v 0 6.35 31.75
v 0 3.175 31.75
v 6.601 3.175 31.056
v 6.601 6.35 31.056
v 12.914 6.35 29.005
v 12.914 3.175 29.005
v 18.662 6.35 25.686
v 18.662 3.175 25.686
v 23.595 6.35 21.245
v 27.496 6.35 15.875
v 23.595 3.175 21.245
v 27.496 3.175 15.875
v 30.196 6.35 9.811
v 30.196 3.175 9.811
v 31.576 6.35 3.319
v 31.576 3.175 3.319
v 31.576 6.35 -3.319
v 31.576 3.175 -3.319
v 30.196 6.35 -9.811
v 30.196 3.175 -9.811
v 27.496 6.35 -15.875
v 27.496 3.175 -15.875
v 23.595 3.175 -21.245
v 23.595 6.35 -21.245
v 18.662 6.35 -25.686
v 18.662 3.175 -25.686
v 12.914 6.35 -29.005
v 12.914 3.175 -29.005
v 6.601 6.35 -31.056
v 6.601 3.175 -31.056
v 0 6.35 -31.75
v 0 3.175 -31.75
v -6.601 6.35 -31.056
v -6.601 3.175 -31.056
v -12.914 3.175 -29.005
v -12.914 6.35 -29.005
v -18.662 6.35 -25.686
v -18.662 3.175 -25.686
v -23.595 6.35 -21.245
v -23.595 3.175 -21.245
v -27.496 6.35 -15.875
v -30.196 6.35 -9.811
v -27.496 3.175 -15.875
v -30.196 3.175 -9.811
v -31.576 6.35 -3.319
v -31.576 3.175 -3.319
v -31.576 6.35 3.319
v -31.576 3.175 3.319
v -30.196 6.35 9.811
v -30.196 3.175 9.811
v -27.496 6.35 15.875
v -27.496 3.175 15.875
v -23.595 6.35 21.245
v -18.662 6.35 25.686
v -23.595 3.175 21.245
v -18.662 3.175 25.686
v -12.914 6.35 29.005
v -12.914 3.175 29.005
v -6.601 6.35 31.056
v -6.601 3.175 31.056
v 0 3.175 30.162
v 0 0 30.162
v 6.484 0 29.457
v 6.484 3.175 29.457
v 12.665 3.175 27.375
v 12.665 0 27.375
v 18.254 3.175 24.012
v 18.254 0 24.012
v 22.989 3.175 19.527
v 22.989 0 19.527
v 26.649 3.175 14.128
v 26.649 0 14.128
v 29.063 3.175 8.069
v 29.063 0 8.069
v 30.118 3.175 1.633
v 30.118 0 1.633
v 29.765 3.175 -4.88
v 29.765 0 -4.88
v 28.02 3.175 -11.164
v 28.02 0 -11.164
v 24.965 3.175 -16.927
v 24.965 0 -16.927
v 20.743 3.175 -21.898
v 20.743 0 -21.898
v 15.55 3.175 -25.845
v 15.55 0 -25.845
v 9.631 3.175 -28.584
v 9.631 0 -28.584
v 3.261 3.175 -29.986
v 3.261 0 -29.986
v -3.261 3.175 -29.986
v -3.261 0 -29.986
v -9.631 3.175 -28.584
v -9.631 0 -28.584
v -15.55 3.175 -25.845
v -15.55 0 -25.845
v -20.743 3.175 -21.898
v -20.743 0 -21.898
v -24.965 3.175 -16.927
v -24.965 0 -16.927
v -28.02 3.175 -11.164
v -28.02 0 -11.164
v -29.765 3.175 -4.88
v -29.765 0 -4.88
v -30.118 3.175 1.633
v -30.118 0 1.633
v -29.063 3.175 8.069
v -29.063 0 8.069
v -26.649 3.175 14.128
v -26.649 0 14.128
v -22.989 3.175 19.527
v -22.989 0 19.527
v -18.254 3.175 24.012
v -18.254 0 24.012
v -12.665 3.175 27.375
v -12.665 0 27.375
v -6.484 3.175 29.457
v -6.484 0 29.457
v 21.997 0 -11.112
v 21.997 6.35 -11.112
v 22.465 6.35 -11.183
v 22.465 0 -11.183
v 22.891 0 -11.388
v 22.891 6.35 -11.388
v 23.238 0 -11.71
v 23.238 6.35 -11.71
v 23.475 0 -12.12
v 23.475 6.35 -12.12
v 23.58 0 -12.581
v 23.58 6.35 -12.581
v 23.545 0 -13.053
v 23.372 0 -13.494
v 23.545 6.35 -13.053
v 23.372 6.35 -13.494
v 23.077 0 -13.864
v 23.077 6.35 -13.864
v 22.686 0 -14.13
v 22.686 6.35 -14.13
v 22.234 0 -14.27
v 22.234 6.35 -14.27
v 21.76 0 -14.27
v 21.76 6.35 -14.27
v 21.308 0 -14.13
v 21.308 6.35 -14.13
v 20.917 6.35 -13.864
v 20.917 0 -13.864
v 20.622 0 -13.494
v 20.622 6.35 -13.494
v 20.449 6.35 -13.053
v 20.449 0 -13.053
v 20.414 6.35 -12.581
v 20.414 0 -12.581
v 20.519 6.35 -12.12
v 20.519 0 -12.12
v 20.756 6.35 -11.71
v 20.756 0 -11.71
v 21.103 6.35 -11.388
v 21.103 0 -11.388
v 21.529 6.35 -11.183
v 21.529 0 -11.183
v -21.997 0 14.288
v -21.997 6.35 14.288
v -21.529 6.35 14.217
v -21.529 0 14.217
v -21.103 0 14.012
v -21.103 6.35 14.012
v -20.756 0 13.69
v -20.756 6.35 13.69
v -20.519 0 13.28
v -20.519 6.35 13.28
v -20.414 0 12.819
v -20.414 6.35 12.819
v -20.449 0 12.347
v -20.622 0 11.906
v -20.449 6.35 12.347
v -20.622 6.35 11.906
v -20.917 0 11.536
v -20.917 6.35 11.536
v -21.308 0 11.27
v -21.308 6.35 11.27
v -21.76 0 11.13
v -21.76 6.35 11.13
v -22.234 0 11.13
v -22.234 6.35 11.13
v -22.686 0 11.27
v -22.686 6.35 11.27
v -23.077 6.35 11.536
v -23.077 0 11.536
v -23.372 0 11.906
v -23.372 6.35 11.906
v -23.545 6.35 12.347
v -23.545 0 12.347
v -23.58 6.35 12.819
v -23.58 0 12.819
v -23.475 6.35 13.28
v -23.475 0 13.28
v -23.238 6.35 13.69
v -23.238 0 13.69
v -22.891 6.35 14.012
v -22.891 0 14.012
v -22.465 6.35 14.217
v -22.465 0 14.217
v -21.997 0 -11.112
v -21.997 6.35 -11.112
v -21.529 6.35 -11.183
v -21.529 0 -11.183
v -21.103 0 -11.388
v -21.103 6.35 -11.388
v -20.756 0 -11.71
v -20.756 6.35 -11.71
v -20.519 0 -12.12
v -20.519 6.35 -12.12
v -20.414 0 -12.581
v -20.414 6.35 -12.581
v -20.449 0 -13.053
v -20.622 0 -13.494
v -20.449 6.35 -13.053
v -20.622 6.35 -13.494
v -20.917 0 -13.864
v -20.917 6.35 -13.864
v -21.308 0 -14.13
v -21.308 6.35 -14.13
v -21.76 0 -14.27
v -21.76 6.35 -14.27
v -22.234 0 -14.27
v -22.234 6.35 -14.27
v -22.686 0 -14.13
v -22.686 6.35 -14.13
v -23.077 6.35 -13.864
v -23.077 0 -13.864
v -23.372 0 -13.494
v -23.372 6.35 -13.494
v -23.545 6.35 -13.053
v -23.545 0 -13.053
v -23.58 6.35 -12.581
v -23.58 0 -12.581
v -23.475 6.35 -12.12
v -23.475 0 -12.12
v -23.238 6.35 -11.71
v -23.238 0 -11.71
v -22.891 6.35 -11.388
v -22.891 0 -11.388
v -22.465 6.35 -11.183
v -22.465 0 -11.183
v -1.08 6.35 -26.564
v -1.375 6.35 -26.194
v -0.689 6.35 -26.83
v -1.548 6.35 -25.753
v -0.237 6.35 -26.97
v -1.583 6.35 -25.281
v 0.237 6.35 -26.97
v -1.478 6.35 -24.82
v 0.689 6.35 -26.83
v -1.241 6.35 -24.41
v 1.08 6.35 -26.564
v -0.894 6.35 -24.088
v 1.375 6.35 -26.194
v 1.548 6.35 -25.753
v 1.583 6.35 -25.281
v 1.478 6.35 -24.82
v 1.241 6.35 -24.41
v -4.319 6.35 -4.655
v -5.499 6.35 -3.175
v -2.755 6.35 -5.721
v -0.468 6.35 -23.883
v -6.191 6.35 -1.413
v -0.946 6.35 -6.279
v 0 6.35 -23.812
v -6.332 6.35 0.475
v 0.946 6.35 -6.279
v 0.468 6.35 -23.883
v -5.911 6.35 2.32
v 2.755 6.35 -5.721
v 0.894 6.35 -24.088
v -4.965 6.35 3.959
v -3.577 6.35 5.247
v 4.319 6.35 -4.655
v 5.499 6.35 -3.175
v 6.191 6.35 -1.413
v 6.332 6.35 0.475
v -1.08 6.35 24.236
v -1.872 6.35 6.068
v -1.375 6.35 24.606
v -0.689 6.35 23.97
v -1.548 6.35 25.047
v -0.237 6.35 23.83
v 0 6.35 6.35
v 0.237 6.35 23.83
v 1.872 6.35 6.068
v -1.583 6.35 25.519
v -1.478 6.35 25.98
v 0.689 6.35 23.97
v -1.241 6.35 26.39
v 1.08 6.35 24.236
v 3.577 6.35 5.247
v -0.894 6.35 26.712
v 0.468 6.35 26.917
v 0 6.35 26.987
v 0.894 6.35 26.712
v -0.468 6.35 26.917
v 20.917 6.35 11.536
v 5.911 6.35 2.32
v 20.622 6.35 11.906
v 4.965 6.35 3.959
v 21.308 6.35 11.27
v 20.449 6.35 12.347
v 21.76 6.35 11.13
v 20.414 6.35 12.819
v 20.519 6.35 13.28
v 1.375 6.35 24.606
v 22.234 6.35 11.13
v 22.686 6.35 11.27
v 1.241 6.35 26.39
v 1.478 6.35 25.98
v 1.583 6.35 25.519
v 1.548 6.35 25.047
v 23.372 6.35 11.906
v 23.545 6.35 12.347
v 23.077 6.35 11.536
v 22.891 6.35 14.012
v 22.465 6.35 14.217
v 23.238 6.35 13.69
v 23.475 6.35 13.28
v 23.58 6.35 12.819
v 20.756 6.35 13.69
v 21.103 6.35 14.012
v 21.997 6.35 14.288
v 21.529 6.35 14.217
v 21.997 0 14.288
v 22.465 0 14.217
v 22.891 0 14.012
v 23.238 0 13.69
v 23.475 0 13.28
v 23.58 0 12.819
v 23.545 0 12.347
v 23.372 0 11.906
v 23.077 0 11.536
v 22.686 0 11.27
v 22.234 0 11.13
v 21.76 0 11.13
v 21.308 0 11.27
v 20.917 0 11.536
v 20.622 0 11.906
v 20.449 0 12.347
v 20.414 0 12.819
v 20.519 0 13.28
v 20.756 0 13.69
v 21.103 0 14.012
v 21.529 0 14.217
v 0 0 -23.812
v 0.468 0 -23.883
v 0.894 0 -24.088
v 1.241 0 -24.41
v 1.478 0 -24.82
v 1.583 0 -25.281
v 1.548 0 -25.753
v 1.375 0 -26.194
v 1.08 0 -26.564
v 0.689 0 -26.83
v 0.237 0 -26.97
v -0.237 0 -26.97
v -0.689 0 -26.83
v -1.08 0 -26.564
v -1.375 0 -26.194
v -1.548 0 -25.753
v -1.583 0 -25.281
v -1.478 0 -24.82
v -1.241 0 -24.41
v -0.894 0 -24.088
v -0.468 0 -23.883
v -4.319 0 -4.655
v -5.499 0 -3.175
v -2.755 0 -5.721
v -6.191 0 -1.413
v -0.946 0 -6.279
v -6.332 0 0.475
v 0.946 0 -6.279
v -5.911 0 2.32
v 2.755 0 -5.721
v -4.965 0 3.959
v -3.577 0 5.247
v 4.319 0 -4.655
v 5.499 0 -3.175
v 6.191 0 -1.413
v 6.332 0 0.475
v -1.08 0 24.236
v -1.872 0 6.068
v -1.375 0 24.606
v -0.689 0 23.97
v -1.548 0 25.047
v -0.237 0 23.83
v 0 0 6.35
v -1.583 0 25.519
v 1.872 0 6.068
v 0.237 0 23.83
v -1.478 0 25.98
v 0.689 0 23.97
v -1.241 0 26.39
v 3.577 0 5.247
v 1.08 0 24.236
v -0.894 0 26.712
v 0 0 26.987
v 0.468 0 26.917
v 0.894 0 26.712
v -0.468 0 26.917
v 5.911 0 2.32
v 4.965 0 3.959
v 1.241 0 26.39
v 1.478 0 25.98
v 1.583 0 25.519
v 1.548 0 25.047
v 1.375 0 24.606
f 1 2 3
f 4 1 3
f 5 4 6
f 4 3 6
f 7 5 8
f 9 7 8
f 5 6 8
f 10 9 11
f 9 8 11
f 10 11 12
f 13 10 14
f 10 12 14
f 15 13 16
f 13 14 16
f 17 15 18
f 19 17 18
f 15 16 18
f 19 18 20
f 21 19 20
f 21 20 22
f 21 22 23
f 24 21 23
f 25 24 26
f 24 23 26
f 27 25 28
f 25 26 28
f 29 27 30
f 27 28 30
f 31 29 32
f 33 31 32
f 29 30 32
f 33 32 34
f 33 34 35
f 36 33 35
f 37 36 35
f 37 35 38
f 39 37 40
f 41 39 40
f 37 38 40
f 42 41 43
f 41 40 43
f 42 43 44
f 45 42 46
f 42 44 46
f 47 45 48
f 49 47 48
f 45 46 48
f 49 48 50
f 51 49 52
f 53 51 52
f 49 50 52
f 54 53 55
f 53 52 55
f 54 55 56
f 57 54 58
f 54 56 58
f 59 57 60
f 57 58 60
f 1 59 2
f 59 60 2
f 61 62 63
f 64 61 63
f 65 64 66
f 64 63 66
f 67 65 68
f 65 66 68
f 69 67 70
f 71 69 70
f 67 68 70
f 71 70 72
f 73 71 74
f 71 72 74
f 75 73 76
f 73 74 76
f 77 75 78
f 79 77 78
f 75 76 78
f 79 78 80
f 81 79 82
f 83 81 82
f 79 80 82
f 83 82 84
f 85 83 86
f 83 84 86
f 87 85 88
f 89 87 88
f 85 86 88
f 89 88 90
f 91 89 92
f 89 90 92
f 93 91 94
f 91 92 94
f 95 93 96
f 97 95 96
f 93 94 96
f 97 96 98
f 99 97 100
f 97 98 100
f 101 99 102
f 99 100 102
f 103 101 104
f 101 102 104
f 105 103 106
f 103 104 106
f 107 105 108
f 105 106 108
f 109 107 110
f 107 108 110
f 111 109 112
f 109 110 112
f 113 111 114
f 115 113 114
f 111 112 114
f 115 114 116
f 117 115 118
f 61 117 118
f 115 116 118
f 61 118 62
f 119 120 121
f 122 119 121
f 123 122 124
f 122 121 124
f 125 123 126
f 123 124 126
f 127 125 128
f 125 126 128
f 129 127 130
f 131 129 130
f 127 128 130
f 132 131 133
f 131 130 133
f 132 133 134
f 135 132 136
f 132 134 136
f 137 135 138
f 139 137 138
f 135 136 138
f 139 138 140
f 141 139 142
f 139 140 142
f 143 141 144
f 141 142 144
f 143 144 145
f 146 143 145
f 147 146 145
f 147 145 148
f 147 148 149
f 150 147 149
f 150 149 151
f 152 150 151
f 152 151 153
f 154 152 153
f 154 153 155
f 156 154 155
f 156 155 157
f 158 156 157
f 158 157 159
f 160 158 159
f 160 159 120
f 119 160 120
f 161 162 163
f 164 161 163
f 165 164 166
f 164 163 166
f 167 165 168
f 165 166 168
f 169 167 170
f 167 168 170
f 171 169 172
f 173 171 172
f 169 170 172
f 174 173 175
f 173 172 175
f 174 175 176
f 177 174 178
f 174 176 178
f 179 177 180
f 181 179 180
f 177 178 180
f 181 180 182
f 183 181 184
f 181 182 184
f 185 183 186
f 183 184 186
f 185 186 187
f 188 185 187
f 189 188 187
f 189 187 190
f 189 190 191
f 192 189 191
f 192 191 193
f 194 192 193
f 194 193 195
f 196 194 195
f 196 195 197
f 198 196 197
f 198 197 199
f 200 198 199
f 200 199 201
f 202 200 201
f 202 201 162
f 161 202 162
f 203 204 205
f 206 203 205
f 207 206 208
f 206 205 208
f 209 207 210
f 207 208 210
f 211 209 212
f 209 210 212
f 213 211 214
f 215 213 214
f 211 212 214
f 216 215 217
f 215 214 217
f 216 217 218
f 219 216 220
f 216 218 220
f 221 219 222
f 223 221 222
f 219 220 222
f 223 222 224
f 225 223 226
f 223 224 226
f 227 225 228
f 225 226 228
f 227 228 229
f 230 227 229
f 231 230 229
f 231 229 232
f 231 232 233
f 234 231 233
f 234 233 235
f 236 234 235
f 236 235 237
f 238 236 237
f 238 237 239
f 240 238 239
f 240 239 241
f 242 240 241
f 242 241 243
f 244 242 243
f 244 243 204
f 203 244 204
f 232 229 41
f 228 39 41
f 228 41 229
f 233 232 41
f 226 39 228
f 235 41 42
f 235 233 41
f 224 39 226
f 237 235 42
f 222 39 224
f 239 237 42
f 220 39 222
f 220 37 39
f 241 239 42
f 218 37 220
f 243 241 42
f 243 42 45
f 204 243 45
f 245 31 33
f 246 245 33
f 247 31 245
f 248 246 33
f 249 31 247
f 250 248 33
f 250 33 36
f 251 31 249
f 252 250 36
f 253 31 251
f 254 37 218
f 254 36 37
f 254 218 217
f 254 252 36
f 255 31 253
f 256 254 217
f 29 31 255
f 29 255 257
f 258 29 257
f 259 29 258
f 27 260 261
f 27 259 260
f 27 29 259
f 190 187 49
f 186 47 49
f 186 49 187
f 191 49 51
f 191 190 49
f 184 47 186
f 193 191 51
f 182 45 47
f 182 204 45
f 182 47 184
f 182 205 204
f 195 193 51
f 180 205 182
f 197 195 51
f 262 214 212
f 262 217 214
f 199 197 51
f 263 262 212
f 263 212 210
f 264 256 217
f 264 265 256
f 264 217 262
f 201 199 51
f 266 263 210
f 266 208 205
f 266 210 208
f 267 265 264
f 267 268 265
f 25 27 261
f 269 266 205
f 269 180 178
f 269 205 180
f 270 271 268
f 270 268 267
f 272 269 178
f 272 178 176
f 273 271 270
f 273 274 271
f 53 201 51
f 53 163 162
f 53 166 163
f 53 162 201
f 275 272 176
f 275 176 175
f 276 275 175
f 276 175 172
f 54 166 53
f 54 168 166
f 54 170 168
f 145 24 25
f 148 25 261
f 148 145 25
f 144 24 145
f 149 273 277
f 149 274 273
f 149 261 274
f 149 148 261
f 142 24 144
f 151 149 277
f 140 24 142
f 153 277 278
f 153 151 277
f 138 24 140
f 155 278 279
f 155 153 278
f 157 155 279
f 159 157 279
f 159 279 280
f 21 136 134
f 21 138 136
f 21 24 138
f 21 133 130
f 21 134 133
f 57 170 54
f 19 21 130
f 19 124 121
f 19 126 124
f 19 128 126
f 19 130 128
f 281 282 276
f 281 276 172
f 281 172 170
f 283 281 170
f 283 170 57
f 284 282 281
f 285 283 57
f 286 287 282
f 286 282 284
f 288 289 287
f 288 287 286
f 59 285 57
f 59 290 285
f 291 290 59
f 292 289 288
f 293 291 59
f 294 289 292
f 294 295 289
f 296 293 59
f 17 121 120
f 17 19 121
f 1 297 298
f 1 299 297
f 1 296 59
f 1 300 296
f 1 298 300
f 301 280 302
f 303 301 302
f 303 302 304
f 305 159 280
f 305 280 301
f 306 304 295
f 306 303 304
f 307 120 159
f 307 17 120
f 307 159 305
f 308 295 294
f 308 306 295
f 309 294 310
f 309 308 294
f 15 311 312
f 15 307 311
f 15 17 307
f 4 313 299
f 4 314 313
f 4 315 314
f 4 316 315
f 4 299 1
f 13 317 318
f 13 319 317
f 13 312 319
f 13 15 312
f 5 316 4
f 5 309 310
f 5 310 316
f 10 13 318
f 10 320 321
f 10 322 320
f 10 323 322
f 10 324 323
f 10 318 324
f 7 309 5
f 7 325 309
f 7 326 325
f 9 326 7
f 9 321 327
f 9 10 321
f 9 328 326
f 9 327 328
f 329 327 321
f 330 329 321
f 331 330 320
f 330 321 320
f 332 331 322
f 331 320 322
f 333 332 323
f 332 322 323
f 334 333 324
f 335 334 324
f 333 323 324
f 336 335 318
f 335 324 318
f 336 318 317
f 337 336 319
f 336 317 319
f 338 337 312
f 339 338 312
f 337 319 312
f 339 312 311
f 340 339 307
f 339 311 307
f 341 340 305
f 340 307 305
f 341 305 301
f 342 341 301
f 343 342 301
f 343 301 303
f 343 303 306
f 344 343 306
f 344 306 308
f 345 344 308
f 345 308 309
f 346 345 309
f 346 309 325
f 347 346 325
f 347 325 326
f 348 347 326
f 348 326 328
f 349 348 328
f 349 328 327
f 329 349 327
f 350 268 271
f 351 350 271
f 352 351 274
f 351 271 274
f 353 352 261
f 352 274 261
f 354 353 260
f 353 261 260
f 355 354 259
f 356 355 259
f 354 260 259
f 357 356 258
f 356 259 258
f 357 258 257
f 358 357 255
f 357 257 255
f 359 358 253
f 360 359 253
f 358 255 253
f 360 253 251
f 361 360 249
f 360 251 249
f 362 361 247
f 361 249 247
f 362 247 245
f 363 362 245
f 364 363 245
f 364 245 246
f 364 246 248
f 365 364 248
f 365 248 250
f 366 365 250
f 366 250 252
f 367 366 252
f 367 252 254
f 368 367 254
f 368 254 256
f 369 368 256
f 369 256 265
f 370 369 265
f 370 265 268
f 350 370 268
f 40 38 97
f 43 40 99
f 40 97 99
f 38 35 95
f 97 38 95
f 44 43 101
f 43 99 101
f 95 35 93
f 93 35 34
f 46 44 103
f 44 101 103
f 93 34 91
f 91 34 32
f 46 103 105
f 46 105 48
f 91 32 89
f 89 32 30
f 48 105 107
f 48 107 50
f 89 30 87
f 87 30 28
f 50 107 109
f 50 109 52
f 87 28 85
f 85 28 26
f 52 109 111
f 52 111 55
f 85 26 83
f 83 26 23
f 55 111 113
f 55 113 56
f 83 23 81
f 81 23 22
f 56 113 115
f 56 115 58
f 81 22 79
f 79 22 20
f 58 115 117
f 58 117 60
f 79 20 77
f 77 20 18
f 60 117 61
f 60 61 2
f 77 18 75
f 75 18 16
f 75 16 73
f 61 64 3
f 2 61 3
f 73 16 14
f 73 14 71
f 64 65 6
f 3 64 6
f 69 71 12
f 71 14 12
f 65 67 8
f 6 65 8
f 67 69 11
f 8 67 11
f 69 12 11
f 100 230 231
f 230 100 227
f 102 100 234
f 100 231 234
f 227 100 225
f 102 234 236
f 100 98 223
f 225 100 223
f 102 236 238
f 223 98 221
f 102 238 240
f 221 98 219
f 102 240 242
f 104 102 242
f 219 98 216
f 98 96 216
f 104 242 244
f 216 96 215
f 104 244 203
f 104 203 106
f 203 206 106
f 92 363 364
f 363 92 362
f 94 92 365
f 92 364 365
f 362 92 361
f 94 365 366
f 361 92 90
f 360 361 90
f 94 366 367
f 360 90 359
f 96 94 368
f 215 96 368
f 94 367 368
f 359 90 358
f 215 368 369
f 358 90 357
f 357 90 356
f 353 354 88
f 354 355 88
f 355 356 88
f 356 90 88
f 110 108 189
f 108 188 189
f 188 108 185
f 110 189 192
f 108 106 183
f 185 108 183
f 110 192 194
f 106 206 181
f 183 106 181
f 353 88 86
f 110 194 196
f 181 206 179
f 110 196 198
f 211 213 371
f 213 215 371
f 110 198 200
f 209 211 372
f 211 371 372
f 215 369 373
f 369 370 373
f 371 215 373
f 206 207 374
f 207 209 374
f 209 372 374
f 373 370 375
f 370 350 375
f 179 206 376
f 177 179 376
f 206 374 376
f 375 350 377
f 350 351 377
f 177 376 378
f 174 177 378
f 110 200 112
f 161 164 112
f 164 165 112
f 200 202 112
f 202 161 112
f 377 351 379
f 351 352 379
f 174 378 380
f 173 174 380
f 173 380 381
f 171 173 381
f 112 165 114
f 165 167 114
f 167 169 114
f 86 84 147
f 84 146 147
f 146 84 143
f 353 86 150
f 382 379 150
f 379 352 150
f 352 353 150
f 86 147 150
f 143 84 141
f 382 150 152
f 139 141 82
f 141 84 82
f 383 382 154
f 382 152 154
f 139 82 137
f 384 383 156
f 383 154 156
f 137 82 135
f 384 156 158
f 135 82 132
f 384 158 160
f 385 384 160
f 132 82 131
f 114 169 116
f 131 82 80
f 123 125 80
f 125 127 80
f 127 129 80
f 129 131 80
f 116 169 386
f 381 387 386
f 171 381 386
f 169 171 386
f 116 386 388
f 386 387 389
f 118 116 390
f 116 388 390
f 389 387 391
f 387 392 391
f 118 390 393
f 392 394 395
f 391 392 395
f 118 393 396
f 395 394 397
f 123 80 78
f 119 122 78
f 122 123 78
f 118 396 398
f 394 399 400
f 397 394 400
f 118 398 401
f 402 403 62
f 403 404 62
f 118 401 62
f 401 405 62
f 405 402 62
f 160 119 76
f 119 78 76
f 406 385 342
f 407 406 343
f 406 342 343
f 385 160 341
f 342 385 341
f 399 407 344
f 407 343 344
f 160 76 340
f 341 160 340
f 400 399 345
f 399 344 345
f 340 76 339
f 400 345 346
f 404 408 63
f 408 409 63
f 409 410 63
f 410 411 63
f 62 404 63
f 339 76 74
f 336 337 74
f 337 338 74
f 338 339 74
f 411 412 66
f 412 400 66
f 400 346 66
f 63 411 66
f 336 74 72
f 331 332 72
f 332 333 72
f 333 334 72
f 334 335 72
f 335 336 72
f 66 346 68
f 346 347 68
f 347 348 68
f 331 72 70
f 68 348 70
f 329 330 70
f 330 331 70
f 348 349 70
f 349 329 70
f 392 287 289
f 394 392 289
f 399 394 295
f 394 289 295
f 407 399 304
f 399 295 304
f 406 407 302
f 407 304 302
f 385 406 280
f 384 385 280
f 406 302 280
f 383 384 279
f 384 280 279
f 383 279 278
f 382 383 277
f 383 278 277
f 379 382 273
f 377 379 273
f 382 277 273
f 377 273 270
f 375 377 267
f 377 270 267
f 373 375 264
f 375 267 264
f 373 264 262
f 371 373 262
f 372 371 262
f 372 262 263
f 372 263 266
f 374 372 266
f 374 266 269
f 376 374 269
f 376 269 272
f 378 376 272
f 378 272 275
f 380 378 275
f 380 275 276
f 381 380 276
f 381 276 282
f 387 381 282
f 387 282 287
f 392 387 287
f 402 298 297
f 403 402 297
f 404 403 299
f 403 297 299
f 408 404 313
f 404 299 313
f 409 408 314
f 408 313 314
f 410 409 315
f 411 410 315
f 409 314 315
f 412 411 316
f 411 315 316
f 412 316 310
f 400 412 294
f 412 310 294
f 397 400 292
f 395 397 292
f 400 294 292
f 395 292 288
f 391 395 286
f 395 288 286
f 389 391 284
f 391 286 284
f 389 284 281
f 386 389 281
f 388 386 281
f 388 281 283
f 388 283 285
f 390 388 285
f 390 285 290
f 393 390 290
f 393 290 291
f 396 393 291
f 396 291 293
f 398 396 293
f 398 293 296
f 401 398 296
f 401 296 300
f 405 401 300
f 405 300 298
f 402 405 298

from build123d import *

# Parameters (mm, degrees)
SKETCH1_R           = 30.1625
BOSS_EXTRUDE1_DEPTH = 3.175
SKETCH2_R           = 31.75
BOSS_EXTRUDE2_DEPTH = 3.175
SKETCH3_R           = 1.5875
SKETCH3_R_2         = 6.35
CUT_EXTRUDE1_DEPTH  = 46.348070521


with BuildPart() as part:
    # Sketch1 → Boss-Extrude1 (new body)
    with BuildSketch(Plane(origin=(0, 0, 0), x_dir=(1, 0, 0), z_dir=(0, 1, 0))):
        with Locations(Location((0, 0, 0), (0, 0, 270))):
            Circle(SKETCH1_R)
    extrude(amount=BOSS_EXTRUDE1_DEPTH)

    # Sketch2 → Boss-Extrude2 (add)
    with BuildSketch(Plane(origin=(0, 3.175, 0), x_dir=(1, 0, 0), z_dir=(0, 1, 0))):
        with Locations(Location((0, 0, 0), (0, 0, 270))):
            Circle(SKETCH2_R)
    extrude(amount=BOSS_EXTRUDE2_DEPTH)

    # Sketch3 → Cut-Extrude1 (cut, through all)
    with BuildSketch(Plane(origin=(0, 6.35, 0), x_dir=(1, 0, 0), z_dir=(0, 1, 0))):
        with Locations(Location((0, 25.4, 0), (0, 0, 270))):
            Circle(SKETCH3_R)
        with Locations(Location((21.997045256, 12.7, 0), (0, 0, 270))):
            Circle(SKETCH3_R)
        with Locations(Location((21.997045256, -12.7, 0), (0, 0, 270))):
            Circle(SKETCH3_R)
        with Locations(Location((0, -25.4, 0), (0, 0, 270))):
            Circle(SKETCH3_R)
        with Locations(Location((-21.997045256, -12.7, 0), (0, 0, 270))):
            Circle(SKETCH3_R)
        with Locations(Location((-21.997045256, 12.7, 0), (0, 0, 270))):
            Circle(SKETCH3_R)
        with Locations(Location((0, 0, 0), (0, 0, 270))):
            Circle(SKETCH3_R_2)
    extrude(amount=-CUT_EXTRUDE1_DEPTH, mode=Mode.SUBTRACT)


solid = part.part
